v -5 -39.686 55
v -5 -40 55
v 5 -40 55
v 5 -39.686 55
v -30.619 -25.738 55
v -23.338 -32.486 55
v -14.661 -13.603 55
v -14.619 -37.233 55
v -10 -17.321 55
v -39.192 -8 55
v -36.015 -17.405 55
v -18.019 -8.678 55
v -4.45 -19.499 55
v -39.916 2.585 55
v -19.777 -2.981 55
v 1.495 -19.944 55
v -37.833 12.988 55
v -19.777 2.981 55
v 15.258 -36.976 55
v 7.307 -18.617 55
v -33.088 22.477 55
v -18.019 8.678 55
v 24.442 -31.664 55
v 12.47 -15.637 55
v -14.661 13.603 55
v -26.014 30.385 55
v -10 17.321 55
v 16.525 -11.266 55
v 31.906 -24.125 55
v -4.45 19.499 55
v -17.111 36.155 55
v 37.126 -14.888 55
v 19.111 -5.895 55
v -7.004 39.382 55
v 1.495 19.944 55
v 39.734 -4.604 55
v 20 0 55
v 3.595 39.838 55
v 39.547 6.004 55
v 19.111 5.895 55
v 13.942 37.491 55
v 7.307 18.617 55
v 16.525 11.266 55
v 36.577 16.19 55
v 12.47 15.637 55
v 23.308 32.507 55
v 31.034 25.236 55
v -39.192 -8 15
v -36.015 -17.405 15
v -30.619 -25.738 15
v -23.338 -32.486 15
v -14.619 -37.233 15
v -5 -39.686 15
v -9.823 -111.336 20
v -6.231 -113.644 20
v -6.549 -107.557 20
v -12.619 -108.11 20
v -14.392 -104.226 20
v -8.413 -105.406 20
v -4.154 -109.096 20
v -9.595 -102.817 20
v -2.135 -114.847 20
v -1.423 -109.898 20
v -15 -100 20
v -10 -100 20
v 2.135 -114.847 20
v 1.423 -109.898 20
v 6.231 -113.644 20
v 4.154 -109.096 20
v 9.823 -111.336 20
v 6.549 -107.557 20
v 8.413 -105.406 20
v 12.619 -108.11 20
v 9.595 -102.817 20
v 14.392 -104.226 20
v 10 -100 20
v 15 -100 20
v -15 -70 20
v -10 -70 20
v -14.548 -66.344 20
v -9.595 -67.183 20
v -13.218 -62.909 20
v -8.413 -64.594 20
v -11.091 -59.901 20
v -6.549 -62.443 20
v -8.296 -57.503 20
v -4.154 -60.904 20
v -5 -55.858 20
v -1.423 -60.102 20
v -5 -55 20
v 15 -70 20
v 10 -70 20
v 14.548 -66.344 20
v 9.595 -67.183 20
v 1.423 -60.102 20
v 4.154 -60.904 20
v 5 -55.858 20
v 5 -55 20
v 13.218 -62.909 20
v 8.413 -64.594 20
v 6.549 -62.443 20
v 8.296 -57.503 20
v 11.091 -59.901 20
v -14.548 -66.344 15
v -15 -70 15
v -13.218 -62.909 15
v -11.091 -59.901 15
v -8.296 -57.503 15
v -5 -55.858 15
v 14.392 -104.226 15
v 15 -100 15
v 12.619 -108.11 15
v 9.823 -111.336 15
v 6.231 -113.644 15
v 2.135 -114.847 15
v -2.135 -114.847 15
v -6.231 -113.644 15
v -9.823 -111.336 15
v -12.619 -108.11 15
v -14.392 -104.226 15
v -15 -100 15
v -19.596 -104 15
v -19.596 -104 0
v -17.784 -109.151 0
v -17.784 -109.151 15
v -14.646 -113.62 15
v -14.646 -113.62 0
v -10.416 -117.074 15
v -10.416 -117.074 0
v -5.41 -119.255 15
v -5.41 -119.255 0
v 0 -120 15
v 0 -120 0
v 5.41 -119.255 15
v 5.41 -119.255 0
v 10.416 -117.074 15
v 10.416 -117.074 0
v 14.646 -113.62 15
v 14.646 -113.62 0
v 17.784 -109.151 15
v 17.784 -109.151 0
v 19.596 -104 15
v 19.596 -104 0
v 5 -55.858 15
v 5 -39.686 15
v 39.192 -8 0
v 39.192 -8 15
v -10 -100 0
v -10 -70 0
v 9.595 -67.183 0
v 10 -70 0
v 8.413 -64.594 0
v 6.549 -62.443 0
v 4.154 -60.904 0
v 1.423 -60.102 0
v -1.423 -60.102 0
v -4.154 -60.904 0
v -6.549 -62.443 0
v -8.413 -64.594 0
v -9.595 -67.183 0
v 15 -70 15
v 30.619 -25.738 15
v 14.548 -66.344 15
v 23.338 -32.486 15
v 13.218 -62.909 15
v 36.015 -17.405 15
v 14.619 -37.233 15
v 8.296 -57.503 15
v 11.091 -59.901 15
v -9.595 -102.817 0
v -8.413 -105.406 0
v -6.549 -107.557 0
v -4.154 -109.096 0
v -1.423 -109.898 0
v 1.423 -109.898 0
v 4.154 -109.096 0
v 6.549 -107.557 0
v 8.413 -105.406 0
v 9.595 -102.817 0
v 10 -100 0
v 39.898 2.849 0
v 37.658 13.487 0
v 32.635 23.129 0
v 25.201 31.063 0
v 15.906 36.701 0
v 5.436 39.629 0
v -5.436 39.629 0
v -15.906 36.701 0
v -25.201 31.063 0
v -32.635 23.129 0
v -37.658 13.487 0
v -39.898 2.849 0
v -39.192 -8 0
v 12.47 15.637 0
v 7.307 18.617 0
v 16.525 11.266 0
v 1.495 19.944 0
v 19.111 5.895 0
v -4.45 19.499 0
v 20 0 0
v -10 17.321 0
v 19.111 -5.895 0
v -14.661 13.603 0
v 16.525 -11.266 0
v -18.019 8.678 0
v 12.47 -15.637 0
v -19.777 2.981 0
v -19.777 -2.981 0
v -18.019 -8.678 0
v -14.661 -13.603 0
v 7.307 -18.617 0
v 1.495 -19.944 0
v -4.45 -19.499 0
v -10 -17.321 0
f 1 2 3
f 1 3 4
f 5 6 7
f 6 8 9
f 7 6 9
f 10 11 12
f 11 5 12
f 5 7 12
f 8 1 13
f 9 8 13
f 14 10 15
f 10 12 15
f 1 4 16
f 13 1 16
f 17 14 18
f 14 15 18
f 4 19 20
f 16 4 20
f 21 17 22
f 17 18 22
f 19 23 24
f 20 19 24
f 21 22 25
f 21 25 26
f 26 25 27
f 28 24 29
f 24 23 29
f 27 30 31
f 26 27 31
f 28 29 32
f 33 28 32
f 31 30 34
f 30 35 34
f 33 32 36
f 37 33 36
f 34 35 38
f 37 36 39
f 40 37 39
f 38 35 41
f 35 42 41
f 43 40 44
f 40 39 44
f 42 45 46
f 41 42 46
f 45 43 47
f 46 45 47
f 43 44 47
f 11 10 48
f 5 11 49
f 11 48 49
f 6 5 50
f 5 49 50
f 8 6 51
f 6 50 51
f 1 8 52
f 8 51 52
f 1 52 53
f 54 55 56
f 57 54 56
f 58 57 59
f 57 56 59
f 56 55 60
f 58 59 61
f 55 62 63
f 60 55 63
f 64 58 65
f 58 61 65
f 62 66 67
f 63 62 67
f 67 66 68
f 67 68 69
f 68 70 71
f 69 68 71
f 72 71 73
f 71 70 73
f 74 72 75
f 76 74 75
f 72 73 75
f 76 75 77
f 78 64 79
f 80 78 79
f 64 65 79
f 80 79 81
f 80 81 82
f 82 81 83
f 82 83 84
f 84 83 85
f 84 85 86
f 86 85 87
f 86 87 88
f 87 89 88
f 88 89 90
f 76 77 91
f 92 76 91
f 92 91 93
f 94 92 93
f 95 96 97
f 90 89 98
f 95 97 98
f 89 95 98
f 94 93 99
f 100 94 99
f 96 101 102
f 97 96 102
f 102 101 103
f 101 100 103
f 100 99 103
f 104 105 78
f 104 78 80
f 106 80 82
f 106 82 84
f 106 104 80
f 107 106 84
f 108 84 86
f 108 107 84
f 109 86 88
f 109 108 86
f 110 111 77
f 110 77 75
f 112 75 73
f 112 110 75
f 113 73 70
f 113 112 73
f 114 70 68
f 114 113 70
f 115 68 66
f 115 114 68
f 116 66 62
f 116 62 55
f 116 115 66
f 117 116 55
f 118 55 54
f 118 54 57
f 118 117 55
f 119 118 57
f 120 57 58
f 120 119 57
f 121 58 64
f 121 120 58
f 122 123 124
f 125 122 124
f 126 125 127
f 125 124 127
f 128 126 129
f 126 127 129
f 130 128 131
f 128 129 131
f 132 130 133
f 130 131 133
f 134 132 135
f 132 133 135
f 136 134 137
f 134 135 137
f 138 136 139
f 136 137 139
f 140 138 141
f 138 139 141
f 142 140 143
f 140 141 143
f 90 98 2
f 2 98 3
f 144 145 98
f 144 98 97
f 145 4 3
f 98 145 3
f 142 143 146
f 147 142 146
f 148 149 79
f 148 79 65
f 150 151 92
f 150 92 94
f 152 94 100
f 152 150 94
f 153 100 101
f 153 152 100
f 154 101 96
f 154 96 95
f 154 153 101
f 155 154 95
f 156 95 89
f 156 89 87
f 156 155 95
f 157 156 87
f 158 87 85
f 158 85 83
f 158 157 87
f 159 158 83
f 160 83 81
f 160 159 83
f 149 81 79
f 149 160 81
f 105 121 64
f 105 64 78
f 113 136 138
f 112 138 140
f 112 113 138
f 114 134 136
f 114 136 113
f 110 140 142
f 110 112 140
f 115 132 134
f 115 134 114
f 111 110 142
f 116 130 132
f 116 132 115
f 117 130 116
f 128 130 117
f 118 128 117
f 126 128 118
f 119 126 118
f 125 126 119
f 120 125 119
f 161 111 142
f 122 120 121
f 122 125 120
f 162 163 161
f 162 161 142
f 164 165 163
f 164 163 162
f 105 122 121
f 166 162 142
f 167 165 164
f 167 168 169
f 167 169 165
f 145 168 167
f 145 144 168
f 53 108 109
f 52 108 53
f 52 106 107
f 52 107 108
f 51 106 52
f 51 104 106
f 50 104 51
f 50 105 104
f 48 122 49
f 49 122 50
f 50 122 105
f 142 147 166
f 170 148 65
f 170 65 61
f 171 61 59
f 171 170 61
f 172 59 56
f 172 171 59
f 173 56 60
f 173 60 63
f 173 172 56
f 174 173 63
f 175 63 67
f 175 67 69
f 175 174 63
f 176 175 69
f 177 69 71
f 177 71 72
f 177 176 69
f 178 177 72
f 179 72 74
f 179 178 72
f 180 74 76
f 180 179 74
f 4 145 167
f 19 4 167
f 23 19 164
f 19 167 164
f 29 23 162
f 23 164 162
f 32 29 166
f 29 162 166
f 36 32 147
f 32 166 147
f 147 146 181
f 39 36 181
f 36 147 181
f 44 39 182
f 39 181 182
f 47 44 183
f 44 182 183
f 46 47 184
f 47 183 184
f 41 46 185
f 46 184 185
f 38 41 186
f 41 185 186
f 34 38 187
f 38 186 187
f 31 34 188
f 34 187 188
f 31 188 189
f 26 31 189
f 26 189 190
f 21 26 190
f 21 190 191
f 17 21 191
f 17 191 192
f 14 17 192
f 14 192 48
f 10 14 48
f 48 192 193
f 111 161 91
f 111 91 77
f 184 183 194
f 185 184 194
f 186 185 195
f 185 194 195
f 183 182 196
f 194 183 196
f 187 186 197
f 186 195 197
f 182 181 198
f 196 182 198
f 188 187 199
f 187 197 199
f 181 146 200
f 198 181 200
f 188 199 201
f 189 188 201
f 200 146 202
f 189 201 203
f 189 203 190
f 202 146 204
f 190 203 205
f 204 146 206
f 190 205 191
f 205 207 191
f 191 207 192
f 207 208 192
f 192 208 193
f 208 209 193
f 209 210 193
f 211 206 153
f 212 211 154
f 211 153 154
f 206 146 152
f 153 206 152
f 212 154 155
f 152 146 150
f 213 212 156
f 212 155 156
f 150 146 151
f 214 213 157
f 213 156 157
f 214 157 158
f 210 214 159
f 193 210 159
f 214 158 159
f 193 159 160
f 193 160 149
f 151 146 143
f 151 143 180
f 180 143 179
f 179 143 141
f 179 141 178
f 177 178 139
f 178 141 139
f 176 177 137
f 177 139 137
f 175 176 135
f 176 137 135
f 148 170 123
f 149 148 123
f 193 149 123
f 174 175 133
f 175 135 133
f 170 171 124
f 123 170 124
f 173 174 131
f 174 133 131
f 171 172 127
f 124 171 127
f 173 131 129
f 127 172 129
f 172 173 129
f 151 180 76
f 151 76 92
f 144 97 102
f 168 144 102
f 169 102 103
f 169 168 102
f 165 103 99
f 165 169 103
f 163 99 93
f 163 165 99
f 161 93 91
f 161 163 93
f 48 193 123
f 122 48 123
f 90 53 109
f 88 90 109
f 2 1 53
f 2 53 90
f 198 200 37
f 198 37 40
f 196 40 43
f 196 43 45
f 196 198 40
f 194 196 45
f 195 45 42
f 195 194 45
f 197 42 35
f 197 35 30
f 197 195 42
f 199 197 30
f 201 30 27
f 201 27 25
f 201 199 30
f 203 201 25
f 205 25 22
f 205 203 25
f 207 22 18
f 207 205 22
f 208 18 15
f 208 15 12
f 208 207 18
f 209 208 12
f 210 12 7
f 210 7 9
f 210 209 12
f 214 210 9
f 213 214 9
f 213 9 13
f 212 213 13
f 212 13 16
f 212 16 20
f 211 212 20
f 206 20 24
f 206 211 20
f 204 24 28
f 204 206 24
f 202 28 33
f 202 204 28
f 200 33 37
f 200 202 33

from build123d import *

# Parameters (mm, degrees)
BOSS_EXTRUDE1_DEPTH = 15
BOSS_EXTRUDE2_DEPTH = 20
SKETCH1_4_R         = 20
BOSS_EXTRUDE3_DEPTH = 55
BOSS_EXTRUDE6_DEPTH = 5


with BuildPart() as part:
    # Sketch1 → Boss-Extrude1 (new body)
    with BuildSketch(Plane(origin=(0, 0, 0), x_dir=(0, 1, 0), z_dir=(0, 0, 1))):
        with BuildLine():
            Line((-8, 39.191835885), (-104, 19.595917942))
            ThreePointArc((-104, 19.595917942), (-120, 0), (-104, -19.595917942))
            Line((-104, -19.595917942), (-8, -39.191835885))
            ThreePointArc((-8, -39.191835885), (-40, 0), (-8, 39.191835885))
        make_face()
        with BuildLine():
            ThreePointArc((-100, -15), (-115, 0), (-100, 15))
            Line((-100, 15), (-70, 15))
            ThreePointArc((-70, 15), (-55, 0), (-70, -15))
            Line((-70, -15), (-100, -15))
        make_face(mode=Mode.SUBTRACT)
    extrude(amount=BOSS_EXTRUDE1_DEPTH)

    # Sketch1<3> → Boss-Extrude2 (add)
    with BuildSketch(Plane(origin=(0, 0, 0), x_dir=(0, 1, 0), z_dir=(0, 0, 1))):
        with BuildLine():
            Line((-70, 15), (-100, 15))
            ThreePointArc((-100, 15), (-115, 0), (-100, -15))
            Line((-100, -15), (-70, -15))
            ThreePointArc((-70, -15), (-55, 0), (-70, 15))
        make_face()
        with BuildLine():
            ThreePointArc((-100, -10), (-110, 0), (-100, 10))
            Line((-100, 10), (-70, 10))
            ThreePointArc((-70, 10), (-60, 0), (-70, -10))
            Line((-70, -10), (-100, -10))
        make_face(mode=Mode.SUBTRACT)
    extrude(amount=BOSS_EXTRUDE2_DEPTH)

    # Sketch1<4> → Boss-Extrude3 (add)
    with BuildSketch(Plane(origin=(0, 0, 0), x_dir=(0, 1, 0), z_dir=(0, 0, 1))):
        with BuildLine():
            ThreePointArc((40, 0), (25.298221281, 30.98386677), (-8, 39.191835885))
            ThreePointArc((-8, 39.191835885), (-40, 0), (-8, -39.191835885))
            ThreePointArc((-8, -39.191835885), (25.298221281, -30.98386677), (40, 0))
        make_face()
        Circle(SKETCH1_4_R, mode=Mode.SUBTRACT)
    extrude(amount=BOSS_EXTRUDE3_DEPTH)

    # Sketch2 → Boss-Extrude6 (add, symmetric)
    with BuildSketch(Plane.YZ):
        Polygon((-55, 20), (-40, 55), (-39, 55), (-39, 15), (-56, 15), (-56, 20), align=None)
    extrude(amount=BOSS_EXTRUDE6_DEPTH, both=True)


solid = part.part
